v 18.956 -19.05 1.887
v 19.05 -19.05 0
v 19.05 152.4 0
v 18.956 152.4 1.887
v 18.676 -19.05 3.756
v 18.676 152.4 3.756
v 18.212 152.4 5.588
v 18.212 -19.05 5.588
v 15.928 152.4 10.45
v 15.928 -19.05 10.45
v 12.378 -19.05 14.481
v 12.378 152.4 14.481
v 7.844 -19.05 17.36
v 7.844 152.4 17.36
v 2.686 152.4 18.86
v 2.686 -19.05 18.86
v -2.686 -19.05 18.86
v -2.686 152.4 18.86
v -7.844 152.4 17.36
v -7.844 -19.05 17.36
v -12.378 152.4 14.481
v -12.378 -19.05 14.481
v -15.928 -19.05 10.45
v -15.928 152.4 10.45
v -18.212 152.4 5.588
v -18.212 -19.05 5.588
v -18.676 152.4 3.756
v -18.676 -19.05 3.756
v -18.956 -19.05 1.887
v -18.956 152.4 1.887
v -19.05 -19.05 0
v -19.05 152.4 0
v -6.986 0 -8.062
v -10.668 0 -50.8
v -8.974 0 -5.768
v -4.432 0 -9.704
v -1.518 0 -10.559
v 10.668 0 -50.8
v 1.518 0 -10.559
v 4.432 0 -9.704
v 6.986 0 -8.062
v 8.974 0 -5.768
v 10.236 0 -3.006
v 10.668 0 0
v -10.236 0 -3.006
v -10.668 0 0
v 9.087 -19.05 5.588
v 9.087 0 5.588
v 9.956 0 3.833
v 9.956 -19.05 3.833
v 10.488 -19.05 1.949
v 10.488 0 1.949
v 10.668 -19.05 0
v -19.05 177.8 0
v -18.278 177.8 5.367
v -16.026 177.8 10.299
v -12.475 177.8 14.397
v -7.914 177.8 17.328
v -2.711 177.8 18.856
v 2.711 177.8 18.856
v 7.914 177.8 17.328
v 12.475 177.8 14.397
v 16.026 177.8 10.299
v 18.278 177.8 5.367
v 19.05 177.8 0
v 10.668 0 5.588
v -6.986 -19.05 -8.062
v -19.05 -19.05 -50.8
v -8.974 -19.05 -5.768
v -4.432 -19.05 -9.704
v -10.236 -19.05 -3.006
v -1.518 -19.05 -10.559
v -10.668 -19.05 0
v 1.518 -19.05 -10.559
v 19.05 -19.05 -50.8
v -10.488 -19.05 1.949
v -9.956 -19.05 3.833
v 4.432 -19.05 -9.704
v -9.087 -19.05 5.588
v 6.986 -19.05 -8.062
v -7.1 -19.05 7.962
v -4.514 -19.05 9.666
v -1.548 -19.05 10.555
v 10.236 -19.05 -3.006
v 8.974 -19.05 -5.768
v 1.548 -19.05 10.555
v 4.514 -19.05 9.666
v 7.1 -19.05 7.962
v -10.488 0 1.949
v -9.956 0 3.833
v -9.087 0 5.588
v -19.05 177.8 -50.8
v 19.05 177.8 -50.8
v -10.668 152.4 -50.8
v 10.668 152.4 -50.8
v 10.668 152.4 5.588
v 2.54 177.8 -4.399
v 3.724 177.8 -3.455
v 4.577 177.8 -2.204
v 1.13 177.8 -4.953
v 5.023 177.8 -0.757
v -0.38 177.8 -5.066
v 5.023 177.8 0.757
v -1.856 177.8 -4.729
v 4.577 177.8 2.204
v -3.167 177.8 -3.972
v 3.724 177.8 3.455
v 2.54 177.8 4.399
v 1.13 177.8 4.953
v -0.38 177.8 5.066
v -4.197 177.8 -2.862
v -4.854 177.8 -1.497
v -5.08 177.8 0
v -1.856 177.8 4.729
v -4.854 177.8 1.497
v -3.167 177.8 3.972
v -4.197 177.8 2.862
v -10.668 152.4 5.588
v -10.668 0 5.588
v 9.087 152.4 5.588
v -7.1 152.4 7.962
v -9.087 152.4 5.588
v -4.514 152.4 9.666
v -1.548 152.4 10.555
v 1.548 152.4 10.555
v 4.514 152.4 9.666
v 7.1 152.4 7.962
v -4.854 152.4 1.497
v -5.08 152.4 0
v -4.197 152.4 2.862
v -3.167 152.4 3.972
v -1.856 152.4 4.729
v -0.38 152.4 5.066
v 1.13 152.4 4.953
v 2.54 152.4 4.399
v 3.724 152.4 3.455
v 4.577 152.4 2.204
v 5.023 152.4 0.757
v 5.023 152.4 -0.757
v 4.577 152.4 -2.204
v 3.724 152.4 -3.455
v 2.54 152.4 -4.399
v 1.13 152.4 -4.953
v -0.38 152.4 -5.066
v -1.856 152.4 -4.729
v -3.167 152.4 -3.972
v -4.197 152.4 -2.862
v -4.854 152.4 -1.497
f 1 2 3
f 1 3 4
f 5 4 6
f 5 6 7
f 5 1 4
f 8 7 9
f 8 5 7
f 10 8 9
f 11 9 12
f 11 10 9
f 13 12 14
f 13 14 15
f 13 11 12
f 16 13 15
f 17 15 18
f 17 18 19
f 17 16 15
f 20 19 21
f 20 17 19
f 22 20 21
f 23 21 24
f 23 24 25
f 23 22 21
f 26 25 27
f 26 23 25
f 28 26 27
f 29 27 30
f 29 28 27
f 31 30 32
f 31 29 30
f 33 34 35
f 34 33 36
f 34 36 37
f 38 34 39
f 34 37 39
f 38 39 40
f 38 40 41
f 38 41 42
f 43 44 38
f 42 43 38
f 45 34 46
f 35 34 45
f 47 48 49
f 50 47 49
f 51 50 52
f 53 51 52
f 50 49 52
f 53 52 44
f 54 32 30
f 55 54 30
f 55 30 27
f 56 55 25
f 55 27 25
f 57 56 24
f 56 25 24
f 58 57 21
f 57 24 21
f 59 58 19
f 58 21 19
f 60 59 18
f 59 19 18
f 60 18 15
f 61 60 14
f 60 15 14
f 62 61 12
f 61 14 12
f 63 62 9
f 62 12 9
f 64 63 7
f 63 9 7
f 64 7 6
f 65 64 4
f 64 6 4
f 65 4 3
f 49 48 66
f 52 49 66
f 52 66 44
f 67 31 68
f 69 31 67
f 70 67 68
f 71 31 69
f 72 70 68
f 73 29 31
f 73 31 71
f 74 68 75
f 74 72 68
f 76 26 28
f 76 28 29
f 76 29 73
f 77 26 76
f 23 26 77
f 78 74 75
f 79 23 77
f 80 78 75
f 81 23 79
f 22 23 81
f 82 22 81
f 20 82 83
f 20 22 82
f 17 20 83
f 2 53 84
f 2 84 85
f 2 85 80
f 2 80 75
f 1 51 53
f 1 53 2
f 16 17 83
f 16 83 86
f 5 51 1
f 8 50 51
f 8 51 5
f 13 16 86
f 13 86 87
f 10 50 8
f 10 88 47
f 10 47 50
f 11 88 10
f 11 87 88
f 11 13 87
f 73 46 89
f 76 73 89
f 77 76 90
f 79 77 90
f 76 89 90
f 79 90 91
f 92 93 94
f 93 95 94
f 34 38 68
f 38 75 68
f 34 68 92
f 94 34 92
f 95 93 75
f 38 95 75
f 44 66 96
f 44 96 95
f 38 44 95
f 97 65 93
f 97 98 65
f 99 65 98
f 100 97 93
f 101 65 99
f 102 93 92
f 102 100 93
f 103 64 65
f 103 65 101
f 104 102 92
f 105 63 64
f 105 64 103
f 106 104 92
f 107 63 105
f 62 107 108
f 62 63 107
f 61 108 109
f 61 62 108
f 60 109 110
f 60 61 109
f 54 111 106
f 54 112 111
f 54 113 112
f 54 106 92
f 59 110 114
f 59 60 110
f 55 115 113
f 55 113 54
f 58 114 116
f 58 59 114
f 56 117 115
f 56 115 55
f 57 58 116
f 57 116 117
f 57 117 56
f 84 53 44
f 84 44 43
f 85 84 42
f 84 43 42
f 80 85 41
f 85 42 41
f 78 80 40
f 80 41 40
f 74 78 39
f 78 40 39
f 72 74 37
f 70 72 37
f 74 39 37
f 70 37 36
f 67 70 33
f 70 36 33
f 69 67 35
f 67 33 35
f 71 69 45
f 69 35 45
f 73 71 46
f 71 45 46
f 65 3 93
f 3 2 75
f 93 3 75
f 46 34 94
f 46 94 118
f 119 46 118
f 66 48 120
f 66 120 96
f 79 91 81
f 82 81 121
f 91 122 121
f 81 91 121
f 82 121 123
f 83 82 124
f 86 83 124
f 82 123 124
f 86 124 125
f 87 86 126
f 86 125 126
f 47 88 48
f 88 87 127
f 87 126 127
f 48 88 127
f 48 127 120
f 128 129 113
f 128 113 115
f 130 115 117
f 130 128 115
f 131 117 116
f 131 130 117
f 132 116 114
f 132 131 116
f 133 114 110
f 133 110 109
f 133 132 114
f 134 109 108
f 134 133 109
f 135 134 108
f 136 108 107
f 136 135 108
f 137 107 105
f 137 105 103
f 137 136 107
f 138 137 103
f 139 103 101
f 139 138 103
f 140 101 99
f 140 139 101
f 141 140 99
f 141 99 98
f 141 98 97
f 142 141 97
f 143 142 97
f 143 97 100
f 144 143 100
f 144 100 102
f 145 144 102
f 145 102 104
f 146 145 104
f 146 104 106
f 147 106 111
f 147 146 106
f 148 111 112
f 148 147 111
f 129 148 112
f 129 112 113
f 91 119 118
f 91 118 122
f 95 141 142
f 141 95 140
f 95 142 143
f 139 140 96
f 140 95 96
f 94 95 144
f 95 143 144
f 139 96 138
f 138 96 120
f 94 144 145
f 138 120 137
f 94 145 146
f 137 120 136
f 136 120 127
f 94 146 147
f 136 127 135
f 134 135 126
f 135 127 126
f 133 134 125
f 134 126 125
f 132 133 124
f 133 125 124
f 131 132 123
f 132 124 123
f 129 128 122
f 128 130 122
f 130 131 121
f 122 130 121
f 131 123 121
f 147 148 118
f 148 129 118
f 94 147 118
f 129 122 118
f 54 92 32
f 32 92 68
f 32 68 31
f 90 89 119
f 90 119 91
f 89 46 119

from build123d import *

# Parameters (mm, degrees)
F1_DEPTH = 19.05
F2_DEPTH = 152.4
F3_R     = 10.668
F3_R_2   = 5.08
F4_DEPTH = 25.4


with BuildPart() as f1:
    # F0 (on Front) → F1 (new body)
    with BuildSketch(Plane.XZ):
        with BuildLine():
            Line((19.05, -50.8), (19.05, 0))
            ThreePointArc((19.05, 0), (18.8393338746, 2.8252432042), (18.2119948386, 5.588))
            Line((18.2119948386, 5.588), (10.668, 5.588))
            Line((10.668, 5.588), (10.668, 0))
            Line((10.668, 0), (10.668, -50.8))
            Line((10.668, -50.8), (19.05, -50.8))
        make_face()
        with BuildLine():
            Line((10.668, 5.588), (18.2119948386, 5.588))
            ThreePointArc((18.2119948386, 5.588), (0, 19.05), (-18.2119948386, 5.588))
            Line((-18.2119948386, 5.588), (-10.668, 5.588))
            Line((-10.668, 5.588), (-9.0873802606, 5.588))
            ThreePointArc((-9.0873802606, 5.588), (0, 10.668), (9.0873802606, 5.588))
            Line((9.0873802606, 5.588), (10.668, 5.588))
        make_face()
        with BuildLine():
            Line((-10.668, 5.588), (-18.2119948386, 5.588))
            ThreePointArc((-18.2119948386, 5.588), (-18.8393338746, 2.8252432042), (-19.05, 0))
            Line((-19.05, 0), (-19.05, -50.8))
            Line((-19.05, -50.8), (-10.668, -50.8))
            Line((-10.668, -50.8), (-10.668, 0))
            Line((-10.668, 0), (-10.668, 5.588))
        make_face()
        with BuildLine():
            Line((-10.668, -50.8), (10.668, -50.8))
            Line((10.668, -50.8), (10.668, 0))
            ThreePointArc((10.668, 0), (0, -10.668), (-10.668, 0))
            Line((-10.668, 0), (-10.668, -50.8))
        make_face()
        with BuildLine():
            Line((10.668, 0), (10.668, 5.588))
            Line((10.668, 5.588), (9.0873802606, 5.588))
            ThreePointArc((9.0873802606, 5.588), (10.2652422431, 2.9036228561), (10.668, 0))
        make_face()
        with BuildLine():
            Line((-9.0873802606, 5.588), (-10.668, 5.588))
            Line((-10.668, 5.588), (-10.668, 0))
            ThreePointArc((-10.668, 0), (-10.2652422431, 2.9036228561), (-9.0873802606, 5.588))
        make_face()
    extrude(amount=F1_DEPTH)

    # F0 (on Front) → F2 (join)
    with BuildSketch(Plane.XZ):
        with BuildLine():
            Line((19.05, -50.8), (19.05, 0))
            ThreePointArc((19.05, 0), (18.8393338746, 2.8252432042), (18.2119948386, 5.588))
            Line((18.2119948386, 5.588), (10.668, 5.588))
            Line((10.668, 5.588), (10.668, 0))
            Line((10.668, 0), (10.668, -50.8))
            Line((10.668, -50.8), (19.05, -50.8))
        make_face()
        with BuildLine():
            Line((10.668, 5.588), (18.2119948386, 5.588))
            ThreePointArc((18.2119948386, 5.588), (0, 19.05), (-18.2119948386, 5.588))
            Line((-18.2119948386, 5.588), (-10.668, 5.588))
            Line((-10.668, 5.588), (-9.0873802606, 5.588))
            ThreePointArc((-9.0873802606, 5.588), (0, 10.668), (9.0873802606, 5.588))
            Line((9.0873802606, 5.588), (10.668, 5.588))
        make_face()
        with BuildLine():
            Line((-10.668, 5.588), (-18.2119948386, 5.588))
            ThreePointArc((-18.2119948386, 5.588), (-18.8393338746, 2.8252432042), (-19.05, 0))
            Line((-19.05, 0), (-19.05, -50.8))
            Line((-19.05, -50.8), (-10.668, -50.8))
            Line((-10.668, -50.8), (-10.668, 0))
            Line((-10.668, 0), (-10.668, 5.588))
        make_face()
    extrude(amount=-F2_DEPTH)

    # F3 (on face) → F4 (join)
    with BuildSketch(Plane(origin=(0, 152.4, 0), x_dir=(-1, 0, 0), z_dir=(0, 1, 0))):
        with BuildLine():
            ThreePointArc((19.05, 0), (0, 19.05), (-19.05, 0))
            Line((-19.05, 0), (-19.05, -50.8))
            Line((-19.05, -50.8), (19.05, -50.8))
            Line((19.05, -50.8), (19.05, 0))
        make_face()
        Circle(F3_R, mode=Mode.SUBTRACT)
        with BuildLine():
            ThreePointArc((-9.0873802606, 5.588), (-10.2652422431, 2.903622856), (-10.668, -1e-10))
            ThreePointArc((-10.668, -1e-10), (0, -10.668), (10.668, 0))
            ThreePointArc((10.668, 0), (10.2652422431, 2.9036228561), (9.0873802606, 5.588))
            ThreePointArc((9.0873802606, 5.588), (0, 10.668), (-9.0873802606, 5.588))
        make_face()
        Circle(F3_R_2, mode=Mode.SUBTRACT)
    extrude(amount=F4_DEPTH)


solid = f1.part
